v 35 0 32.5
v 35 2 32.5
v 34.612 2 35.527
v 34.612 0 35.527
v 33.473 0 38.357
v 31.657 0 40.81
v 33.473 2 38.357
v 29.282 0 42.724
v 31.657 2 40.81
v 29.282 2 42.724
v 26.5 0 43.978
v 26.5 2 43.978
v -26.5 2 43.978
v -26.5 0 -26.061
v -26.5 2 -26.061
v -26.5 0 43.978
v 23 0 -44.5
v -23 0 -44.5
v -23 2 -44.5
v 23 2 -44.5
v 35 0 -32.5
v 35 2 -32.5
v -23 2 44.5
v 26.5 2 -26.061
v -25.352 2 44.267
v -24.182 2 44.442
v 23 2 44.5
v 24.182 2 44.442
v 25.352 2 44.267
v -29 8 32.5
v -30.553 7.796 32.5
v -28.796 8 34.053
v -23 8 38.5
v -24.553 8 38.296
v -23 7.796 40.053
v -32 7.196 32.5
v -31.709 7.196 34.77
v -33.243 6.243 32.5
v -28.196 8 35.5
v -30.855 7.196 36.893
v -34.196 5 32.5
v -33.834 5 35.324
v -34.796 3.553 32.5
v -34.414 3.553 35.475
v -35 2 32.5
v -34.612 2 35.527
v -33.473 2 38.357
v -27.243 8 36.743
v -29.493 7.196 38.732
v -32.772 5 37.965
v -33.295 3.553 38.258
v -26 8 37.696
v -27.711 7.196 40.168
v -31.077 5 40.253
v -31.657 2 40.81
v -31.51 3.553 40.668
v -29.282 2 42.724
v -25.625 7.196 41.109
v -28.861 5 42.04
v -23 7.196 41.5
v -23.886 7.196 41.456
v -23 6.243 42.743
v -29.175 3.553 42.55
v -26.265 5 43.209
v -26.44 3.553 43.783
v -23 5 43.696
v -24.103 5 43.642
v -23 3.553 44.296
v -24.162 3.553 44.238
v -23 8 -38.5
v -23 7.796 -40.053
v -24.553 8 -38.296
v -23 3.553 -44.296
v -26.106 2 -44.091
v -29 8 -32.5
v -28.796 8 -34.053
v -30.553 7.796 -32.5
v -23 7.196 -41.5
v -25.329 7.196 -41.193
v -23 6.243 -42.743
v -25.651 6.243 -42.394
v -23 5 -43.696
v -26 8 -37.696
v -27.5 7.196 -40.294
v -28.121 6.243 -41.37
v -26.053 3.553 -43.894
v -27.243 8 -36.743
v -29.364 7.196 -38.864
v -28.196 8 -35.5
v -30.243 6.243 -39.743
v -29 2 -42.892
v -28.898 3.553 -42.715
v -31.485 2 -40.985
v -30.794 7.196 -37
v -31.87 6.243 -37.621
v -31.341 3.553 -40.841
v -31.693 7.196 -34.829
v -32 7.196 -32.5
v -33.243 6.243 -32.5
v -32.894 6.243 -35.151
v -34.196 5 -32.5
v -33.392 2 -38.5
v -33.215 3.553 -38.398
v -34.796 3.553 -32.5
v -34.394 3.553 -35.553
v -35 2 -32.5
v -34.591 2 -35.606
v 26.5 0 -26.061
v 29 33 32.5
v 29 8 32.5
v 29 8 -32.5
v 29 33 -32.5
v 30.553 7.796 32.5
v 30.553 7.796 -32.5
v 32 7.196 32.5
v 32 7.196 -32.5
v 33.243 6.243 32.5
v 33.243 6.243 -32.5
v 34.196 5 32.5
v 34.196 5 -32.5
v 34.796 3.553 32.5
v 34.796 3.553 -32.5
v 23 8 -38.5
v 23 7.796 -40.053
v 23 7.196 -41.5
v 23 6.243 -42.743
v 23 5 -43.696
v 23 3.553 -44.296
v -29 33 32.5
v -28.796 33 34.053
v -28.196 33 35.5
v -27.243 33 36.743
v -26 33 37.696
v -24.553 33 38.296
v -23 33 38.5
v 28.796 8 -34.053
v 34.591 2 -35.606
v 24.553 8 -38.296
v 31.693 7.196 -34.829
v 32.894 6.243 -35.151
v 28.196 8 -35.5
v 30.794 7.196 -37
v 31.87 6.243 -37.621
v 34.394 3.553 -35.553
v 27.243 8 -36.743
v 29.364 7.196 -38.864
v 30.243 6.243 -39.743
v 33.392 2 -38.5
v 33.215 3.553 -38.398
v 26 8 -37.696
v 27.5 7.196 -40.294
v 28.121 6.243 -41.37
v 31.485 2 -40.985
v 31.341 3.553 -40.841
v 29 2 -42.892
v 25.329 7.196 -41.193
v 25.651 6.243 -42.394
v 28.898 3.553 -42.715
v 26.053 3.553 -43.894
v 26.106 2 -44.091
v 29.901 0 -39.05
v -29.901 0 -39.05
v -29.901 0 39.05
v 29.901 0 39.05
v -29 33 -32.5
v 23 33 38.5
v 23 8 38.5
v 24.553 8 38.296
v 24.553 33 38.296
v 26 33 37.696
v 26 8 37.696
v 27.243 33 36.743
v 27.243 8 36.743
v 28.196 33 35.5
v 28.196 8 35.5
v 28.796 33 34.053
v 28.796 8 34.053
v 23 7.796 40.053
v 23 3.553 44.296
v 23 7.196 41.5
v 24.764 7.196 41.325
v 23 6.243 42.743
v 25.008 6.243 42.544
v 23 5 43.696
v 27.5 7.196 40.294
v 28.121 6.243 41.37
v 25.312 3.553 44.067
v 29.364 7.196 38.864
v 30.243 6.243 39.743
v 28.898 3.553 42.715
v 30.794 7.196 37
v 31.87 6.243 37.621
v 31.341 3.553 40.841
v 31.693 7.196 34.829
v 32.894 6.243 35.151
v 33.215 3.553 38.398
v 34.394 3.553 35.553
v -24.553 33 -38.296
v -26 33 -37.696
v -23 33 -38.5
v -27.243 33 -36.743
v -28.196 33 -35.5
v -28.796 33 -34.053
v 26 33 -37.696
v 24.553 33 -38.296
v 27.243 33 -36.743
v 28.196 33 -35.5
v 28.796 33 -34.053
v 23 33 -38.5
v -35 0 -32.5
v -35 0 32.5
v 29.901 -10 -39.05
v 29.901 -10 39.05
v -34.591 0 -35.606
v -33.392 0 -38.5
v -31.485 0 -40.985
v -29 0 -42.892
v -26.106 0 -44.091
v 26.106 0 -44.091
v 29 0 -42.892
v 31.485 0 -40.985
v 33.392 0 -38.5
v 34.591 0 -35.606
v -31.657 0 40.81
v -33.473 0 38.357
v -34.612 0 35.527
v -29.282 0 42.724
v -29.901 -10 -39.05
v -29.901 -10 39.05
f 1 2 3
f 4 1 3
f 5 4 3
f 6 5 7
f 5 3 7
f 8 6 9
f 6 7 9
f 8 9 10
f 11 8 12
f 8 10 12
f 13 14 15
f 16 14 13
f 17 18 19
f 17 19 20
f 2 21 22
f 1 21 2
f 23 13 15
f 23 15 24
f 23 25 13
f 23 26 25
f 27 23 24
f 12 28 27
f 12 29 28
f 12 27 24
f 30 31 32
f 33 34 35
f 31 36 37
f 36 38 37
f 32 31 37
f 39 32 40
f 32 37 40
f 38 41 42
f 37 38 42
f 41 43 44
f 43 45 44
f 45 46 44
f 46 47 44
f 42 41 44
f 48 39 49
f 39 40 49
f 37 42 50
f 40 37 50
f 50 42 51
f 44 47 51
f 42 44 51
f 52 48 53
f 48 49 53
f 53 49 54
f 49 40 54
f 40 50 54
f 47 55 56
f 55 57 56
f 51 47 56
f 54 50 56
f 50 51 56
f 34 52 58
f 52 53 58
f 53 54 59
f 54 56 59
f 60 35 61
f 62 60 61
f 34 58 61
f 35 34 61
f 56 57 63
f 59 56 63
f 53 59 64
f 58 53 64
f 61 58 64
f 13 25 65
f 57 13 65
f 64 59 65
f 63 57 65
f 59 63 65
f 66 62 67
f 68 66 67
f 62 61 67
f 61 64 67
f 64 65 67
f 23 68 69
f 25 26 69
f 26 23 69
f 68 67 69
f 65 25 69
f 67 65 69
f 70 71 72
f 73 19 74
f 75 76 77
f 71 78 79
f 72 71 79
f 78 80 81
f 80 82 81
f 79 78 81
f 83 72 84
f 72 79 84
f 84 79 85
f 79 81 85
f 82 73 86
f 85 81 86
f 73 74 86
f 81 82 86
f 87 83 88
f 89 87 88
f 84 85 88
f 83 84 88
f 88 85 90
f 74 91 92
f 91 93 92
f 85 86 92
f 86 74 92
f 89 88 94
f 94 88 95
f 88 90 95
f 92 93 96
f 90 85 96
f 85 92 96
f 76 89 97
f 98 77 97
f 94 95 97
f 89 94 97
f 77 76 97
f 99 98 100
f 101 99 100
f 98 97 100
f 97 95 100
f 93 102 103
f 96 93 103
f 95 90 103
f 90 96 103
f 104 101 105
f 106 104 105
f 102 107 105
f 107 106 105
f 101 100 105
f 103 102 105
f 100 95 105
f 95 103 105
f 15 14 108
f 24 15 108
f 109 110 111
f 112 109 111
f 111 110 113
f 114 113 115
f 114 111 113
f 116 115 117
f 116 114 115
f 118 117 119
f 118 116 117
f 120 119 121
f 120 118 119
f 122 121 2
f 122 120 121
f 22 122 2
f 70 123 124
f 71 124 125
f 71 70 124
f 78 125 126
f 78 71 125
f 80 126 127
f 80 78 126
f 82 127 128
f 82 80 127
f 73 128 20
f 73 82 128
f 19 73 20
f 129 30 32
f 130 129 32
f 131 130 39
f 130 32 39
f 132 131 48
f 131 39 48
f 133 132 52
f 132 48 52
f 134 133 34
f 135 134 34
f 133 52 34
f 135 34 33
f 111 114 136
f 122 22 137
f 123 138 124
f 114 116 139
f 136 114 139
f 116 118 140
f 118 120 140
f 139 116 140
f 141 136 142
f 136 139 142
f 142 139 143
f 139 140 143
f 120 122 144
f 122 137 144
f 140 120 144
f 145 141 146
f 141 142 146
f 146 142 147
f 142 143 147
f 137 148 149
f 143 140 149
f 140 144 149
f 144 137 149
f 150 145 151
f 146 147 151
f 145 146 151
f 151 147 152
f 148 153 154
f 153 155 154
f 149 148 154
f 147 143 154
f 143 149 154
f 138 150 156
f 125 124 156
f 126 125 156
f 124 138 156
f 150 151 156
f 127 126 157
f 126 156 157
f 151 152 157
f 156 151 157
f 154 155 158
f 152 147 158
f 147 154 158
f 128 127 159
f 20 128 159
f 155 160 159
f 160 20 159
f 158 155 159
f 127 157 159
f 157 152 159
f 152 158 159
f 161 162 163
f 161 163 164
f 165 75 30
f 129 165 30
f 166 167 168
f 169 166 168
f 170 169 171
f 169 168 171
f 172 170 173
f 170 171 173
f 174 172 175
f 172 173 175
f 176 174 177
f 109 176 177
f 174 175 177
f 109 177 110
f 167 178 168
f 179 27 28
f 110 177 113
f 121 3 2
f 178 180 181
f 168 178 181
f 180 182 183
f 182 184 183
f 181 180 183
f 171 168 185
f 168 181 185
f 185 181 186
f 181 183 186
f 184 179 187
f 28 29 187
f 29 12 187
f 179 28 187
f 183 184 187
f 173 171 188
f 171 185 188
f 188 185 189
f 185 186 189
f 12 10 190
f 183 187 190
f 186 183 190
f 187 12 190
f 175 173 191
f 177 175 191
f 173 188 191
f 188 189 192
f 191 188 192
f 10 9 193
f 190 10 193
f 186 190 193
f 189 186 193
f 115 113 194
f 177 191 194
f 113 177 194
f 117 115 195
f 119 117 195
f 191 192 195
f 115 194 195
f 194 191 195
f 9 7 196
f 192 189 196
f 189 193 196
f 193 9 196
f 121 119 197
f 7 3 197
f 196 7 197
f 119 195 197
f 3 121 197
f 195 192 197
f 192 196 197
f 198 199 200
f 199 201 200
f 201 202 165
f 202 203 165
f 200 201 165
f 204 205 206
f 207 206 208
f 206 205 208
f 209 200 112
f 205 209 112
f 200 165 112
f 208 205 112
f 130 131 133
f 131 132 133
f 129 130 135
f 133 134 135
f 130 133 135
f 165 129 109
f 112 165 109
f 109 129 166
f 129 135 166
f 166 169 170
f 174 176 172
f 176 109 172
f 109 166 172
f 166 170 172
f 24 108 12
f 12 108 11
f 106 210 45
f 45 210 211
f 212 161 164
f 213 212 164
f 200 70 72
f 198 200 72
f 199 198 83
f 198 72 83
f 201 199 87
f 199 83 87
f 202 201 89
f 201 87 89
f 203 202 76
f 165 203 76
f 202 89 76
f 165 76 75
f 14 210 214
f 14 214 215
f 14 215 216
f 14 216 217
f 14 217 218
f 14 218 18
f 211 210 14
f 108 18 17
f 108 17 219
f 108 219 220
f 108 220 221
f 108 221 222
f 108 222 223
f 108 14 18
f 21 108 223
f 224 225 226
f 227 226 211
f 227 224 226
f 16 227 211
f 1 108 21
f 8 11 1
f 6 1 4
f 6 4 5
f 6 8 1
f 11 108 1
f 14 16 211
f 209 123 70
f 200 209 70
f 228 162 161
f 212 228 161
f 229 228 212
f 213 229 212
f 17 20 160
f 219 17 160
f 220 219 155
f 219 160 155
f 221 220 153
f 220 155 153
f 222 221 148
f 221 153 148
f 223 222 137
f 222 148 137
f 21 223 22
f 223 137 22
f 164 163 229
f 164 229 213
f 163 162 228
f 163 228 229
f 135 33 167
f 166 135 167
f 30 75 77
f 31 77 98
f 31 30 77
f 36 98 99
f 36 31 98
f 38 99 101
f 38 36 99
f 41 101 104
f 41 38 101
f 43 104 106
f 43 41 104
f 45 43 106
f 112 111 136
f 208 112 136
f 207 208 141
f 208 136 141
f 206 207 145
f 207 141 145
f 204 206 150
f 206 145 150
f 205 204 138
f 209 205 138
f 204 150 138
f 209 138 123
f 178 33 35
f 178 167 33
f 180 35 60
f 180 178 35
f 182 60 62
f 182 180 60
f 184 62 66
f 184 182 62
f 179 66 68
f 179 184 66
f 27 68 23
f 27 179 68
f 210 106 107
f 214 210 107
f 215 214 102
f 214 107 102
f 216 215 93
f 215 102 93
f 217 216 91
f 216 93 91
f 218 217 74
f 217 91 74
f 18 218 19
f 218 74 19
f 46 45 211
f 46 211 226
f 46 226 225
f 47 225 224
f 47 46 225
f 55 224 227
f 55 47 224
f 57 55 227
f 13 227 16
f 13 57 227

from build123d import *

# Parameters (mm, degrees)
F0_W     = 70
F0_H     = 89
F1_DEPTH = 8
F2_R     = 12
F3_R     = 6
F4_W     = 52.9997386038
F4_H     = 141.1219484508
F5_DEPTH = 2
F6_W     = 59.8021745682
F6_H     = 78.1007856131
F7_DEPTH = 10
F8_DEPTH = 25


with BuildPart() as f1:
    # F0 (on Front) → F1 (new body)
    with BuildSketch(Plane.XZ):
        Rectangle(F0_W, F0_H)
    extrude(amount=-F1_DEPTH)

    # F2
    f2_edges = [f1.edges().sort_by_distance(p)[0] for p in [
        (-35, 4, 44.5),
        (35, 4, 44.5),
        (-35, 4, -44.5),
        (35, 4, -44.5),
    ]]
    fillet(f2_edges, radius=F2_R)

    # F3
    f3_edges = [f1.edges().sort_by_distance(p)[0] for p in [
        (0, 8, 44.5),
        (31.485281, 8, 40.985281),
        (35, 8, 0),
        (31.485281, 8, -40.985281),
        (0, 8, -44.5),
        (-31.485281, 8, -40.985281),
        (-35, 8, 0),
        (-31.485281, 8, 40.985281),
    ]]
    fillet(f3_edges, radius=F3_R)

    # F4 (on face) → F5 (cut)
    with BuildSketch(Plane.XZ):
        with Locations((0, 44.5)):
            Rectangle(F4_W, F4_H)
    extrude(amount=-F5_DEPTH, mode=Mode.SUBTRACT)

    # F8 (add): a face of the model
    f8_faces = [f1.faces().sort_by_distance(p)[0] for p in [
        (0, 8, 0),
    ]]
    extrude(f8_faces, amount=F8_DEPTH)


with BuildPart() as f7:
    # F6 (on face) → F7 (new body)
    with BuildSketch(Plane.XZ):
        Rectangle(F6_W, F6_H)
    extrude(amount=F7_DEPTH)


solid = Compound([f1.part, f7.part])
